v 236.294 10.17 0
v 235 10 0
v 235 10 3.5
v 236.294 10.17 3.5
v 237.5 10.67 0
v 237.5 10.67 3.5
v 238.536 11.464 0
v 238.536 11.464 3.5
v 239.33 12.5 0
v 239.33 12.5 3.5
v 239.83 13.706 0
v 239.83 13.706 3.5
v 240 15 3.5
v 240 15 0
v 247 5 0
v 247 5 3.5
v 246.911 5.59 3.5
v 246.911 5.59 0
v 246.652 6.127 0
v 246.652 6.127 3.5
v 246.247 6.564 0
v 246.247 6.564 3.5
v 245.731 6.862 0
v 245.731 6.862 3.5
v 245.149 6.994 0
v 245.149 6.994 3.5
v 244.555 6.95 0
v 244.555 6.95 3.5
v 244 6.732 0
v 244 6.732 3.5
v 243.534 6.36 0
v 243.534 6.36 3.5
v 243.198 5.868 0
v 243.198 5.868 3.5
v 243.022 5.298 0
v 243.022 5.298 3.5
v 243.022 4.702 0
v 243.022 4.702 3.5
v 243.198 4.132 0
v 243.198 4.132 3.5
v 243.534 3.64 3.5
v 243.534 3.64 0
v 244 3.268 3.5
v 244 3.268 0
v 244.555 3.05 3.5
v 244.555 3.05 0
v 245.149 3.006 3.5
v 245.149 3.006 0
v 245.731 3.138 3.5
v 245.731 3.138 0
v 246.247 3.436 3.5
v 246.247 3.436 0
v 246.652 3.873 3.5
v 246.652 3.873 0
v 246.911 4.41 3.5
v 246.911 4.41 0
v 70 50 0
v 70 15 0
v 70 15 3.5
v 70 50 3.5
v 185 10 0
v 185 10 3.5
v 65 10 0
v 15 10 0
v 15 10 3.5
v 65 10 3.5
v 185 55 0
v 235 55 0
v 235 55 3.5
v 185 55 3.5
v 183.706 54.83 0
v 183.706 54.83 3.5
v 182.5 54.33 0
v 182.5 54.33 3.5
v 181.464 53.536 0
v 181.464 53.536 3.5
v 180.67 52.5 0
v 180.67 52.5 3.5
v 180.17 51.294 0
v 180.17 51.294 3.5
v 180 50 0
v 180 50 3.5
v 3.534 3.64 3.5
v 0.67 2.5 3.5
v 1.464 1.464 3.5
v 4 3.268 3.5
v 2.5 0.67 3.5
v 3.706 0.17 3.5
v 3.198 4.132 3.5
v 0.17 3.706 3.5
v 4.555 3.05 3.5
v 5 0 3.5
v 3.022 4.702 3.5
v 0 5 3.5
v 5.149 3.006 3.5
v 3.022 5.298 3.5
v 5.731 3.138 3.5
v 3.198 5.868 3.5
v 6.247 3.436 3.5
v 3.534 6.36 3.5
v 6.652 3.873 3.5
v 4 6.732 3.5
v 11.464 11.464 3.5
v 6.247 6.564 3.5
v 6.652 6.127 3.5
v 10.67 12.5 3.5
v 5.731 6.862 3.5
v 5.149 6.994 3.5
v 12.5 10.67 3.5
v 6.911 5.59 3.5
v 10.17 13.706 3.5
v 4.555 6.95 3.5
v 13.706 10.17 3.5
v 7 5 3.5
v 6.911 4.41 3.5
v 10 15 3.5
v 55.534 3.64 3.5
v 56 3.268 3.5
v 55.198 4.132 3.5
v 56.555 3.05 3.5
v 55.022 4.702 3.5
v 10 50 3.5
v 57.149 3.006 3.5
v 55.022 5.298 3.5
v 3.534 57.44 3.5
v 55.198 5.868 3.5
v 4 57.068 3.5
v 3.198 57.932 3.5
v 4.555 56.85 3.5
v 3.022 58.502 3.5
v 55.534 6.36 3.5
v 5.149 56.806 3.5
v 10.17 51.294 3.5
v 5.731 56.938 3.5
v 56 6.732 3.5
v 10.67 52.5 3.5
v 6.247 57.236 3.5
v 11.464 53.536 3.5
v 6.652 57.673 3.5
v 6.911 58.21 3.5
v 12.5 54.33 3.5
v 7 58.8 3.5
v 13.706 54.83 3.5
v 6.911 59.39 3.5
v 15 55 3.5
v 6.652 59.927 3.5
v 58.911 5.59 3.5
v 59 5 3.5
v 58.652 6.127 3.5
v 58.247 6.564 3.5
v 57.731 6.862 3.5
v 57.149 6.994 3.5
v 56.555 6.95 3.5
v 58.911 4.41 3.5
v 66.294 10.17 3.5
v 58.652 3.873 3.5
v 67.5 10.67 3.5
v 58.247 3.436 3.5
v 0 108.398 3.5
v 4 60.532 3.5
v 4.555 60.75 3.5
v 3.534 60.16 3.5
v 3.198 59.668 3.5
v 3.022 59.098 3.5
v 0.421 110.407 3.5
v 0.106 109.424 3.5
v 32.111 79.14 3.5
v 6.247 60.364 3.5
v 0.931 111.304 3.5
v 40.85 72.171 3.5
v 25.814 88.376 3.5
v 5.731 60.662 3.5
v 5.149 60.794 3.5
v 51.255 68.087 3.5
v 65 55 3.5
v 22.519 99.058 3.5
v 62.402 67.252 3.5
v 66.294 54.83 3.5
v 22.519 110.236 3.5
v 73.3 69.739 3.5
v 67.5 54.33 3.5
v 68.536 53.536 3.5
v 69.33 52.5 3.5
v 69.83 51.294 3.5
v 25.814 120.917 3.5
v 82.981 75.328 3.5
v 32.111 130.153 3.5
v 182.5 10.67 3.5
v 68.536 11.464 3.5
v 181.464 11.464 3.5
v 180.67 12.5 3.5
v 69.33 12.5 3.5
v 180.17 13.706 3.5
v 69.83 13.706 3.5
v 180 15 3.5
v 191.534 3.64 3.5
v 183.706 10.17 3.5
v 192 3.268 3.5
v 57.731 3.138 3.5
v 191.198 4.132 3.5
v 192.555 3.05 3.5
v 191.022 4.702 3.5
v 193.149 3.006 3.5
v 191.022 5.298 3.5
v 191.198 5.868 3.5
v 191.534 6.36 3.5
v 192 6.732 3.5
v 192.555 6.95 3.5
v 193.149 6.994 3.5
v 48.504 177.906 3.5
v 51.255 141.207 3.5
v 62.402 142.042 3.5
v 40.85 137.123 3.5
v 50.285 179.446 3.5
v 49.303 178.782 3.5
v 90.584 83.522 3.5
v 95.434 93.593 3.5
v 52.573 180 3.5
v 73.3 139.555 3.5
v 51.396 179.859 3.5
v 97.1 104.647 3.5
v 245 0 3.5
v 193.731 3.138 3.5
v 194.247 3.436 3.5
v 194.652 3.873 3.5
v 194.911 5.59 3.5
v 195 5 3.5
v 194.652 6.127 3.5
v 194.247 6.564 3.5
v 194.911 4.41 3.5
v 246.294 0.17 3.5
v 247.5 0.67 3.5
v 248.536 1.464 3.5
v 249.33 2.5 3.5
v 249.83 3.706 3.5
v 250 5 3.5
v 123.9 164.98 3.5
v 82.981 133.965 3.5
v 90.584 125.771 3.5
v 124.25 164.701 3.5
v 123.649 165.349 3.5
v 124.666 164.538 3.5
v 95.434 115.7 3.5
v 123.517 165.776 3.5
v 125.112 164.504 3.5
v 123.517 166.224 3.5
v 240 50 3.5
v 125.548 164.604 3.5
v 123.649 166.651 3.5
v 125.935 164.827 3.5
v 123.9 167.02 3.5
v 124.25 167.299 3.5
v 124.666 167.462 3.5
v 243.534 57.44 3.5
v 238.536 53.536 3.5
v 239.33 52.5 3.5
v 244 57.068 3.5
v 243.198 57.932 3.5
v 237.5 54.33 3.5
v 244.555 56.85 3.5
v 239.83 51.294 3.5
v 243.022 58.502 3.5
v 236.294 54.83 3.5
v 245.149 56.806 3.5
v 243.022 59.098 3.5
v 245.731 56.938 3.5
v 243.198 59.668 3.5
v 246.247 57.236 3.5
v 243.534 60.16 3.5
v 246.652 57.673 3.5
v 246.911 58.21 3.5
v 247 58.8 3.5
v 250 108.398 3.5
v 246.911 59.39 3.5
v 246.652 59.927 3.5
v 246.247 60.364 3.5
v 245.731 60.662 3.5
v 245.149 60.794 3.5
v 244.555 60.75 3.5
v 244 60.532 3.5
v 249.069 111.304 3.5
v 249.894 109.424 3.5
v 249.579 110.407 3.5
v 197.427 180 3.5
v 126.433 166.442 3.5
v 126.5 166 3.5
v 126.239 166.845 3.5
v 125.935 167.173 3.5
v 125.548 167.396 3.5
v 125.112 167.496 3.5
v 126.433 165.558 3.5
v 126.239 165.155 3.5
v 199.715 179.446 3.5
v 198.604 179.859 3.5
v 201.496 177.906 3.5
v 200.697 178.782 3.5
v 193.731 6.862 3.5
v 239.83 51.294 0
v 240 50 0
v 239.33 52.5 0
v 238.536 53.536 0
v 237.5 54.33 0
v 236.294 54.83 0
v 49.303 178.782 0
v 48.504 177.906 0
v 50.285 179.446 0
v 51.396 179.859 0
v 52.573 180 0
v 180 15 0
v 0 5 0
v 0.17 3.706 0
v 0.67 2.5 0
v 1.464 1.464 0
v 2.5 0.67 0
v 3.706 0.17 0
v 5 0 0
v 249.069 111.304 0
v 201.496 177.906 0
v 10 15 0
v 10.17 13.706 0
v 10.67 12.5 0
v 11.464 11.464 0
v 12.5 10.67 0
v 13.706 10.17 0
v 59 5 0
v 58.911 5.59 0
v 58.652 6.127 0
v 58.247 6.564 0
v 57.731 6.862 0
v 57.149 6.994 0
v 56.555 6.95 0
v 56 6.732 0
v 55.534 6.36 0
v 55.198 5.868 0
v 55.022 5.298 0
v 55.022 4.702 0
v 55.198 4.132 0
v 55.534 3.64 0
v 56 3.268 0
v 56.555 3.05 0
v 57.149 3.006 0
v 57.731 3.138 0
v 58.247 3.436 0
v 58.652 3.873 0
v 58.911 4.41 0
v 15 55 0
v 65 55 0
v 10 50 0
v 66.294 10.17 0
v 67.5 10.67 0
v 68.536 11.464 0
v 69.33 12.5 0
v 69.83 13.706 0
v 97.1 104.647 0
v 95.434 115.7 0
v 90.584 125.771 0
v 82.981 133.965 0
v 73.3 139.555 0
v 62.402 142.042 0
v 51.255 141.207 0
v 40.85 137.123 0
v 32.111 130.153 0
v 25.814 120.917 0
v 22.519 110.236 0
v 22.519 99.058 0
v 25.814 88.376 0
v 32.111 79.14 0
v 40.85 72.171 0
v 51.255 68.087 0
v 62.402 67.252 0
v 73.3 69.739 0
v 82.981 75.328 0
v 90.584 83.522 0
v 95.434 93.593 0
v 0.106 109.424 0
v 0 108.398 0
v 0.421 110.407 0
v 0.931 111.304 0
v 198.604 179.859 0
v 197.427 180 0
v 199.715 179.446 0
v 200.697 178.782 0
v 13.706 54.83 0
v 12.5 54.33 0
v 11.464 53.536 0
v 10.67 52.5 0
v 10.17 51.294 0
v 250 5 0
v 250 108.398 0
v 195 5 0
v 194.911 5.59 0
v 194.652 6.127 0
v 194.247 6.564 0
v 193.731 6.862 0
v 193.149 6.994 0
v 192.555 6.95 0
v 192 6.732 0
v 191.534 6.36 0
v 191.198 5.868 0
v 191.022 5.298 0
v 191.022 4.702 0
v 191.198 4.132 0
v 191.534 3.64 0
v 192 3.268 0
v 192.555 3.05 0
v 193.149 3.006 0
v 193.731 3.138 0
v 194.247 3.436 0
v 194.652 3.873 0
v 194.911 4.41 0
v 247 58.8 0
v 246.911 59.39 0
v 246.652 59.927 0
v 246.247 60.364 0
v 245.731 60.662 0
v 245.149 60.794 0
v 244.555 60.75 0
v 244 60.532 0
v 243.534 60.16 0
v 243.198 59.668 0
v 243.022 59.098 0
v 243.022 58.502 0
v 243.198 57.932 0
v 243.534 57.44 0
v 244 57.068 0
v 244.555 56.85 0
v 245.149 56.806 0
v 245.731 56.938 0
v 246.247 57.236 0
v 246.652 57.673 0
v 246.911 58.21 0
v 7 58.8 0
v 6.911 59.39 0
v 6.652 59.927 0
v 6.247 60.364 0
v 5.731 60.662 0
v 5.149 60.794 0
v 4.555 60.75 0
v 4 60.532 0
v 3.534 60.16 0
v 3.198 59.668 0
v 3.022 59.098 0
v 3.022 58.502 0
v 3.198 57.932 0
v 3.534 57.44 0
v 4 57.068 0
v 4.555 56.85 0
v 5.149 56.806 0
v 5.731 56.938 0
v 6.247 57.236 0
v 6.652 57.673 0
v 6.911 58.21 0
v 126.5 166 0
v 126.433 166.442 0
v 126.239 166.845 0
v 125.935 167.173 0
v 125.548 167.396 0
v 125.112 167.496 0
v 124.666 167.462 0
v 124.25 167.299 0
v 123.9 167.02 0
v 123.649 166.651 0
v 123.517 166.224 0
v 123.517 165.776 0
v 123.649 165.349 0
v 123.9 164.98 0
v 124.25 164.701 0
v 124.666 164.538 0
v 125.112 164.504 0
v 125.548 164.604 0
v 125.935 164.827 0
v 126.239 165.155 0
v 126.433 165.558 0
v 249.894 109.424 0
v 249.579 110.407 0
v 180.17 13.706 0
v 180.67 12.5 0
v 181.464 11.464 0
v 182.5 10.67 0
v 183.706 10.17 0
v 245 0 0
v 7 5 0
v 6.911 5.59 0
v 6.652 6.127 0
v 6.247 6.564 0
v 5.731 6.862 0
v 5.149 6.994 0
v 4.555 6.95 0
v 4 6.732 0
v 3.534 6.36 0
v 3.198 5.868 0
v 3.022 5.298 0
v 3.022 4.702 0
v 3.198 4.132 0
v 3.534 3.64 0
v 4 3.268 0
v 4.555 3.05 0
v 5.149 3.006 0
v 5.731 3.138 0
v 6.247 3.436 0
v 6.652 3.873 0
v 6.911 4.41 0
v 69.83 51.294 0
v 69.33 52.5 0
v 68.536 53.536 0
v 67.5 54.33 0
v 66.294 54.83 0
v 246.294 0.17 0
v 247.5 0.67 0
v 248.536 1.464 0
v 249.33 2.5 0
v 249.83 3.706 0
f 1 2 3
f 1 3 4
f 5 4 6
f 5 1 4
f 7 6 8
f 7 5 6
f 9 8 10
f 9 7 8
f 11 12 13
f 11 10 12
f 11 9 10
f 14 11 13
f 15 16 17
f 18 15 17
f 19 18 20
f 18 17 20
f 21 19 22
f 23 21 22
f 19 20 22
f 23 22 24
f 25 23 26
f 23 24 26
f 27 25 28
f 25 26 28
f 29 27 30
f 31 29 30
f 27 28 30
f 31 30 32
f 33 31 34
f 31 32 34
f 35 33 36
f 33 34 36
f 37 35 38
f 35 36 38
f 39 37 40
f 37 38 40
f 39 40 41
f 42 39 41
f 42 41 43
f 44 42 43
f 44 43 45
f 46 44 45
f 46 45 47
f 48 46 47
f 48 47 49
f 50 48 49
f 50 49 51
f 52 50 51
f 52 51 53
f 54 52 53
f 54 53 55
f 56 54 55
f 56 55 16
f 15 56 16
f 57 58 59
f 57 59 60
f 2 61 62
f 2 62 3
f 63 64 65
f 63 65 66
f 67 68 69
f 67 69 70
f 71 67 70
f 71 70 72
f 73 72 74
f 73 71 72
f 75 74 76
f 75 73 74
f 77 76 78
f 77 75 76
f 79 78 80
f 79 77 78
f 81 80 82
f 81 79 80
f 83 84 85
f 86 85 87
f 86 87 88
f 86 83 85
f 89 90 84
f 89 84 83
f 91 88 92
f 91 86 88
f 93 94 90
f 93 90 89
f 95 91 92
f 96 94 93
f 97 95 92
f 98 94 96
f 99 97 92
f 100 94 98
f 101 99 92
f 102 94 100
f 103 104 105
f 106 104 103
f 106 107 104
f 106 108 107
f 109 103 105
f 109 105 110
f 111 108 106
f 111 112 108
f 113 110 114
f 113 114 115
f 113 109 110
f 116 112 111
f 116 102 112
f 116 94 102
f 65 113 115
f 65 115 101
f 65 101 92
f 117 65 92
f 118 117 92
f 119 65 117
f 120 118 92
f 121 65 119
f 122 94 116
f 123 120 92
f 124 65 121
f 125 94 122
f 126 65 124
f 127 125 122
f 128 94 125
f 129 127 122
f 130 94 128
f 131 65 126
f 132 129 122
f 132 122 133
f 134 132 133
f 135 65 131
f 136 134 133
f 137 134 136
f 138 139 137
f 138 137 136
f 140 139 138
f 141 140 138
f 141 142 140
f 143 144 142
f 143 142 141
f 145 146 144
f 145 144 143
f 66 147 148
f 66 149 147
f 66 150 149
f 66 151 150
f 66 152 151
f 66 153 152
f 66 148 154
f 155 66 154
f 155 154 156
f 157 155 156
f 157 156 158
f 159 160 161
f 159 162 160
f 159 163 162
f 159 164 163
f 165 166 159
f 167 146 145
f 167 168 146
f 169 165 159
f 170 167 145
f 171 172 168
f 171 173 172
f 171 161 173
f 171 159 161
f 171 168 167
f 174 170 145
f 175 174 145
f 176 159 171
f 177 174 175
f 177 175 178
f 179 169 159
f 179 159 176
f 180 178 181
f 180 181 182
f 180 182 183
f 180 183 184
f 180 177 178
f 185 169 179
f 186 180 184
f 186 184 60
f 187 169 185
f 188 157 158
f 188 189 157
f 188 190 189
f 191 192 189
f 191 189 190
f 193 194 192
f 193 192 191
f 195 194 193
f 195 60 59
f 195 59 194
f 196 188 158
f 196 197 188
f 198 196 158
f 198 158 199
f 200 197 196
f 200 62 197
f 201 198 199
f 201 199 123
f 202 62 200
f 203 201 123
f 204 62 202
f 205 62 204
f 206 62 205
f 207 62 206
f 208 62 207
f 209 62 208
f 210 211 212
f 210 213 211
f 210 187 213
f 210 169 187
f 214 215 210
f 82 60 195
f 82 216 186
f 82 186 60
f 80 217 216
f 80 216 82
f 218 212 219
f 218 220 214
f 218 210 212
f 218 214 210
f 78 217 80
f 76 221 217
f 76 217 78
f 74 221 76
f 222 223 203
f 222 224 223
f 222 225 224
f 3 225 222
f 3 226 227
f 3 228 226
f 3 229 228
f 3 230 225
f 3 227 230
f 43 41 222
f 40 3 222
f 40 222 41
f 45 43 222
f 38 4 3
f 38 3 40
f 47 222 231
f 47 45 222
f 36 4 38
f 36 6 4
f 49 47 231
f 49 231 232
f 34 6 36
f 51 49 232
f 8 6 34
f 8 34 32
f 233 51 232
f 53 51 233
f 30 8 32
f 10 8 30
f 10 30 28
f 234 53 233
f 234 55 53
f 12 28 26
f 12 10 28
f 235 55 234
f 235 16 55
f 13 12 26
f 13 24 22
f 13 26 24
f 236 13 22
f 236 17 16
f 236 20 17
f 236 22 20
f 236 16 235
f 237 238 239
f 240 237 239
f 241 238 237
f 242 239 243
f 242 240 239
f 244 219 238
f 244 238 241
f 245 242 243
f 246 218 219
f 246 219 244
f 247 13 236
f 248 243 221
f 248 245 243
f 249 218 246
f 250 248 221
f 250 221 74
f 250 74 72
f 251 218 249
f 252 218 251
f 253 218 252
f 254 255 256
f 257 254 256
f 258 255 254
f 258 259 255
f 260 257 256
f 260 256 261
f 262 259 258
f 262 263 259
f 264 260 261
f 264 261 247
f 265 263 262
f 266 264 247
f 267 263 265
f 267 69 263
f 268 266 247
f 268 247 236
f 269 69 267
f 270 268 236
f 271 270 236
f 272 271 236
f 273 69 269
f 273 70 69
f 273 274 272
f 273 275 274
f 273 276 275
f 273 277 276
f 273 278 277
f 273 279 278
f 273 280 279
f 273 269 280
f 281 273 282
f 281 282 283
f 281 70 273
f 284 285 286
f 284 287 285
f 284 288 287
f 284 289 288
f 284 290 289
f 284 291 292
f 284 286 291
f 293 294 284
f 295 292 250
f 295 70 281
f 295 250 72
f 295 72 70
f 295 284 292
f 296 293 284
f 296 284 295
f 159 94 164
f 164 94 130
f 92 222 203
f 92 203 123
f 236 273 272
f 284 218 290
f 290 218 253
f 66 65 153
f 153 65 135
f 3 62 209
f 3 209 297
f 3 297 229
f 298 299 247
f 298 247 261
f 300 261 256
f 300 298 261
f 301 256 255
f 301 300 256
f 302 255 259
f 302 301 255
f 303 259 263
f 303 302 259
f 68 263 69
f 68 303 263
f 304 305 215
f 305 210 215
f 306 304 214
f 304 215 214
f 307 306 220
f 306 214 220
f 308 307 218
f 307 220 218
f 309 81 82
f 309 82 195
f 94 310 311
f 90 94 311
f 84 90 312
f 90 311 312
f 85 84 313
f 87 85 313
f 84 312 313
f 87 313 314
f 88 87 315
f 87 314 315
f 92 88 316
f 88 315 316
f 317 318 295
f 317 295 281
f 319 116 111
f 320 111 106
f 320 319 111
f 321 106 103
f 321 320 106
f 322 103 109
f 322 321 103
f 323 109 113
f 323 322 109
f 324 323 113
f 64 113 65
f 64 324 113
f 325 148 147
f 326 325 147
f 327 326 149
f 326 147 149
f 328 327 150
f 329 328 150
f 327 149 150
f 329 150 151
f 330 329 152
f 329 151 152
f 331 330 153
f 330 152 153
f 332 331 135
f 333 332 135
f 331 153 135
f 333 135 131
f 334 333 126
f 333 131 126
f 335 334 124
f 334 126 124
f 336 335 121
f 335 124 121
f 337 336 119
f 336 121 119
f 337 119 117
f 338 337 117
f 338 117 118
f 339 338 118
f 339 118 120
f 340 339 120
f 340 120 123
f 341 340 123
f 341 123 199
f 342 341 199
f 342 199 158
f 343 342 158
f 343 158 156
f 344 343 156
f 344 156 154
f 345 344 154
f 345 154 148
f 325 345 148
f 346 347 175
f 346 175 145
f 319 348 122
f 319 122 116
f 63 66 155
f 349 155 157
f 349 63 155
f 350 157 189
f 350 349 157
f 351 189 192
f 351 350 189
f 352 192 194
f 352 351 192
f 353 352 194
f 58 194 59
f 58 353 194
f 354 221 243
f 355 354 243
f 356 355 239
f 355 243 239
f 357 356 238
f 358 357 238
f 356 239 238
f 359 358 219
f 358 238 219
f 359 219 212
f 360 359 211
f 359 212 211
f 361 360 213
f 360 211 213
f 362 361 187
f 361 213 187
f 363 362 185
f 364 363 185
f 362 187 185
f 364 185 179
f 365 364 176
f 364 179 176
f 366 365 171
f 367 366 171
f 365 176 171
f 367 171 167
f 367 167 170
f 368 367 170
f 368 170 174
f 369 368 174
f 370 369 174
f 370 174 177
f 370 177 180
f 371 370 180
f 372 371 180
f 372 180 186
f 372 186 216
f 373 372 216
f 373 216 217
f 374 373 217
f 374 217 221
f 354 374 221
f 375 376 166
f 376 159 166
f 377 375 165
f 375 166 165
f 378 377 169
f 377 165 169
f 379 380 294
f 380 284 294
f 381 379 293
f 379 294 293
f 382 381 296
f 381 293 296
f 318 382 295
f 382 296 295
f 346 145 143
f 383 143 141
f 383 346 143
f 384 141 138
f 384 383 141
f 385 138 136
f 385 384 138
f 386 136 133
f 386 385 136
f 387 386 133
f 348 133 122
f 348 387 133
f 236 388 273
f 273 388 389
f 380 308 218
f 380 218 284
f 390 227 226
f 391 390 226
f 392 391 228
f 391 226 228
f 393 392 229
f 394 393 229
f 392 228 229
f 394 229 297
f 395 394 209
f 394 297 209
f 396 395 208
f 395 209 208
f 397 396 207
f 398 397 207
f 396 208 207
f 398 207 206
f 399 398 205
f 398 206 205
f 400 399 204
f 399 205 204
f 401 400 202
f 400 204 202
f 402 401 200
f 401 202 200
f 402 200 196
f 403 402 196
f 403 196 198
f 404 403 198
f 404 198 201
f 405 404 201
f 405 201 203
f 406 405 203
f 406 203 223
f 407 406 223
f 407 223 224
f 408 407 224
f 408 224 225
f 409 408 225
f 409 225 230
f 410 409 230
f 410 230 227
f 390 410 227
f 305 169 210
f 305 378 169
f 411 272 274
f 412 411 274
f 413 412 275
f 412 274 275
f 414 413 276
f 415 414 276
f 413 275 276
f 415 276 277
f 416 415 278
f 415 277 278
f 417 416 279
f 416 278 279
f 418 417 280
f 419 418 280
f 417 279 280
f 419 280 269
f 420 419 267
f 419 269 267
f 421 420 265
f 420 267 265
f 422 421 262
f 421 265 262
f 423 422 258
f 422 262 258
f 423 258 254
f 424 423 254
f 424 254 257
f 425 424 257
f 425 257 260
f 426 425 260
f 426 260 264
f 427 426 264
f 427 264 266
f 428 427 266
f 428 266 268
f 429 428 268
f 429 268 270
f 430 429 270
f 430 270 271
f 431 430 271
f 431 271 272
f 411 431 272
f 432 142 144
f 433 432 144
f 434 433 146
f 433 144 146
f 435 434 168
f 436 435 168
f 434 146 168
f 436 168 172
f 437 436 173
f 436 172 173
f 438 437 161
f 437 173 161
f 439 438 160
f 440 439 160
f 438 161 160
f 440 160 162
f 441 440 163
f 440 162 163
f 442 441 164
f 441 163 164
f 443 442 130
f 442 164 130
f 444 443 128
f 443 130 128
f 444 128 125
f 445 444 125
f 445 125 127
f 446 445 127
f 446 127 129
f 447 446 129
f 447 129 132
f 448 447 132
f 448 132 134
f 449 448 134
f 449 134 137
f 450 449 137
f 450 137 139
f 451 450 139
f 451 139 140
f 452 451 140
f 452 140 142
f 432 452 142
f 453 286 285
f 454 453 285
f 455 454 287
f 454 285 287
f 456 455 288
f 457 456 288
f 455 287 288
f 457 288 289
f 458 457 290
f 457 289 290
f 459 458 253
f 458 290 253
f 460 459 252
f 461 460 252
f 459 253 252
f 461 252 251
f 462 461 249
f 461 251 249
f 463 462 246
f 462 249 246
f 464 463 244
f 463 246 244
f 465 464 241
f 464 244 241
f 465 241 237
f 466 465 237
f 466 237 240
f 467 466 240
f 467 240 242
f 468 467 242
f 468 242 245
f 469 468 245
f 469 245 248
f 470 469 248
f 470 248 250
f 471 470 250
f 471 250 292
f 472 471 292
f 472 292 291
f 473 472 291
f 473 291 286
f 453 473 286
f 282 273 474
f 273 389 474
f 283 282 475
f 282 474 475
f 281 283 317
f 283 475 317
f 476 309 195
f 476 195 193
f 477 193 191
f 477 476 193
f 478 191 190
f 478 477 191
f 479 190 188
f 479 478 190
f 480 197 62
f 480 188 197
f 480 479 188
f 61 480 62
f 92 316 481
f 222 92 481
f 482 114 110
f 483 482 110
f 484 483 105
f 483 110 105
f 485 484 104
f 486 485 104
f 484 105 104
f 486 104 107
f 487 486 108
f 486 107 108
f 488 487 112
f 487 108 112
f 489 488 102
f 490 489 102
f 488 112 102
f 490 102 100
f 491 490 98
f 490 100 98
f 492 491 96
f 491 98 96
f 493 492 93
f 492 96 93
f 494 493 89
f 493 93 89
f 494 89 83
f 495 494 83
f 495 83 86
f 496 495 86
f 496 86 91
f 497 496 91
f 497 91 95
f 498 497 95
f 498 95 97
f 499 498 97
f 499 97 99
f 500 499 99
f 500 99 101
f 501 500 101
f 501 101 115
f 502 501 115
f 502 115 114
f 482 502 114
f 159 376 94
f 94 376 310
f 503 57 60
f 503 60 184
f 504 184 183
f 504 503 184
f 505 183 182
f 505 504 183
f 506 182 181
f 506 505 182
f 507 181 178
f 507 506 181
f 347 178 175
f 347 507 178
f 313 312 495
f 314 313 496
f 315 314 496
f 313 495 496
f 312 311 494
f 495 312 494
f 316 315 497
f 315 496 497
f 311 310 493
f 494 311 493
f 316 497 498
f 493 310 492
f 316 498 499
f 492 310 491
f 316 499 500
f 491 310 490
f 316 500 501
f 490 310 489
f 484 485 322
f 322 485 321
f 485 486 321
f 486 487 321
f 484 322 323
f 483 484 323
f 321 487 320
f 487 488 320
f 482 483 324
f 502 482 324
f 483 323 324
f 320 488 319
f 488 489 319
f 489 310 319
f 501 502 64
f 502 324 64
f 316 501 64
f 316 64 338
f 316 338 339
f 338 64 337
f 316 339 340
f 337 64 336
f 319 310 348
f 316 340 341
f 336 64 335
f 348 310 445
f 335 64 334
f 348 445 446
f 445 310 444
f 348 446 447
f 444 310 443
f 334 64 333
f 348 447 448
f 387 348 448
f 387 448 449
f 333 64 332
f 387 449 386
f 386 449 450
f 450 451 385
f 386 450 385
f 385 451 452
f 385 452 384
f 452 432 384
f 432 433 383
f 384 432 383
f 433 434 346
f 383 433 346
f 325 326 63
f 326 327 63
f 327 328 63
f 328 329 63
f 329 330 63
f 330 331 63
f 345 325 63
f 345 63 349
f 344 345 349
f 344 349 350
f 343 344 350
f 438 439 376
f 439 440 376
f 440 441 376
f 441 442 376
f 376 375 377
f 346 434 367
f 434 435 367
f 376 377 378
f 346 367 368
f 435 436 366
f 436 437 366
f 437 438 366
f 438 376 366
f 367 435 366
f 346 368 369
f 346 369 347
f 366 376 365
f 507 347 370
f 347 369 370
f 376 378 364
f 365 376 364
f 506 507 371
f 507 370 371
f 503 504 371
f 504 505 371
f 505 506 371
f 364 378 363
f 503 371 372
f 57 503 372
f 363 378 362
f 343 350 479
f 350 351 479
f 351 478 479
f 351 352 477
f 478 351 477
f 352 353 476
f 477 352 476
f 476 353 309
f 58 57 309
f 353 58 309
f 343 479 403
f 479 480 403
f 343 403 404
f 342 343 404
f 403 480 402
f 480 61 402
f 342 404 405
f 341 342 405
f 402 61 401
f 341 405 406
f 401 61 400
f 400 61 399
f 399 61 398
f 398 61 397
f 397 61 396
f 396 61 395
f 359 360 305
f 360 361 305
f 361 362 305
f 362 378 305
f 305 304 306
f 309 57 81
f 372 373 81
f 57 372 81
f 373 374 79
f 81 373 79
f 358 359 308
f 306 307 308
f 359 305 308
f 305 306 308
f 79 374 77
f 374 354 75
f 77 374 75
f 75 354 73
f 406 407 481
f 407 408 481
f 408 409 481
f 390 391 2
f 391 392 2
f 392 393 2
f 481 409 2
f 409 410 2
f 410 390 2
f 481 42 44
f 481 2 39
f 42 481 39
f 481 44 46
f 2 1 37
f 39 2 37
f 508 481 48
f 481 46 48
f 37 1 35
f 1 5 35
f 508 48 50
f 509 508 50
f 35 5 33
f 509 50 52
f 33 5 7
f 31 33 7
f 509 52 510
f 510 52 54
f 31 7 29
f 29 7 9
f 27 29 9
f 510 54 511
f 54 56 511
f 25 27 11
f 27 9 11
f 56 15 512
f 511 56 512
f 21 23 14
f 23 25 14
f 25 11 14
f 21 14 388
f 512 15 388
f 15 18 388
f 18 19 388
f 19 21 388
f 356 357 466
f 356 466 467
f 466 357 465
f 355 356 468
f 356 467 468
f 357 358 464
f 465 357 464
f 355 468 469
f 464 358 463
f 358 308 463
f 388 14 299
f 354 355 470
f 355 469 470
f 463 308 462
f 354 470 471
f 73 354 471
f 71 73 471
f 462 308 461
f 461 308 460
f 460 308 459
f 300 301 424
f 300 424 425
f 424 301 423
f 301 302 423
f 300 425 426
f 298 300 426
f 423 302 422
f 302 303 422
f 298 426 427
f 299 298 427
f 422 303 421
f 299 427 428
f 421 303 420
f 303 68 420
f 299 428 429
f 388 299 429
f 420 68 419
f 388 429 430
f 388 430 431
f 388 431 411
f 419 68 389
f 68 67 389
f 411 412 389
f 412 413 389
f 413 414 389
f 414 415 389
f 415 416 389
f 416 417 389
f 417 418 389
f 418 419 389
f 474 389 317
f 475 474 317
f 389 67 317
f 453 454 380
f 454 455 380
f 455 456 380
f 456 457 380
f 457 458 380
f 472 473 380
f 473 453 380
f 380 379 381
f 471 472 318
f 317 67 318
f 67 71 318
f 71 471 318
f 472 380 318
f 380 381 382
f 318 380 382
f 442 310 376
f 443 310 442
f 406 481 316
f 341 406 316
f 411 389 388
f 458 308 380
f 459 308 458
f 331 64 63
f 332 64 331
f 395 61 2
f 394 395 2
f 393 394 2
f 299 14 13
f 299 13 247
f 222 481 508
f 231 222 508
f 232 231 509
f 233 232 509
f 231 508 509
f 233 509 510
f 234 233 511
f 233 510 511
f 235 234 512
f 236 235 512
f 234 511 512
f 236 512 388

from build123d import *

# Parameters (mm, degrees)
BOSS_EXTRU_1_DEPTH           = 3.5
ESQUISSE2_R                  = 2
ENL_V_MAT_EXTRU_1_DEPTH      = 395.382111663
ESQUISSE3_R                  = 2
ENL_V_MAT_EXTRU_2_DEPTH      = 395.382111663
ENL_V_MAT_EXTRU_3_DEPTH      = 395.382111663
ENL_V_MAT_EXTRU_4_DEPTH      = 395.382111663
ENL_V_MAT_EXTRU_4_DEPTH_BACK = 395.382111663
ESQUISSE6_R                  = 1.5
ENL_V_MAT_EXTRU_5_DEPTH      = 309.078317965
CONG_1_R                     = 5
ESQUISSE7_R                  = 37.5
ENL_V_MAT_EXTRU_6_DEPTH      = 309.078317965


with BuildPart() as part:
    # Esquisse1 → Boss.-Extru.1 (new body)
    with BuildSketch(Plane.XY):
        with BuildLine():
            Line((5, 0), (245, 0))
            ThreePointArc((245, 0), (248.535533906, 1.464466094), (250, 5))
            Line((250, 5), (250, 305))
            Line((250, 305), (0, 305))
            Line((0, 305), (0, 5))
            ThreePointArc((0, 5), (1.464466094, 1.464466094), (5, 0))
        make_face()
    extrude(amount=BOSS_EXTRU_1_DEPTH)

    # Esquisse2 → Enlèv. mat.-Extru.1 (cut, through all)
    with BuildSketch(Plane.XY.offset(3.5)):
        with Locations((5, 5)):
            Circle(ESQUISSE2_R)
        with Locations((245, 5)):
            Circle(ESQUISSE2_R)
        with Locations((5, 58.8)):
            Circle(ESQUISSE2_R)
        with Locations((245, 58.8)):
            Circle(ESQUISSE2_R)
    extrude(amount=-ENL_V_MAT_EXTRU_1_DEPTH, mode=Mode.SUBTRACT)

    # Esquisse3 → Enlèv. mat.-Extru.2 (cut, through all)
    with BuildSketch(Plane.XY.offset(3.5)):
        with Locations((57, 5)):
            Circle(ESQUISSE3_R)
        with Locations((193, 5)):
            Circle(ESQUISSE3_R)
    extrude(amount=-ENL_V_MAT_EXTRU_2_DEPTH, mode=Mode.SUBTRACT)

    # Esquisse4 → Enlèv. mat.-Extru.3 (cut, through all)
    with BuildSketch(Plane(origin=(0, 0, 0), x_dir=(-1, 0, 0), z_dir=(0, 0, -1))):
        with BuildLine():
            Line((-70, 15), (-70, 50))
            ThreePointArc((-70, 50), (-68.535533906, 53.535533906), (-65, 55))
            Line((-65, 55), (-15, 55))
            ThreePointArc((-15, 55), (-11.464466094, 53.535533906), (-10, 50))
            Line((-10, 50), (-10, 15))
            ThreePointArc((-10, 15), (-11.464466094, 11.464466094), (-15, 10))
            Line((-15, 10), (-65, 10))
            ThreePointArc((-65, 10), (-68.535533906, 11.464466094), (-70, 15))
        make_face()
        with BuildLine():
            Line((-185, 10), (-235, 10))
            ThreePointArc((-235, 10), (-238.535533906, 11.464466094), (-240, 15))
            Line((-240, 15), (-240, 50))
            ThreePointArc((-240, 50), (-238.535533906, 53.535533906), (-235, 55))
            Line((-235, 55), (-185, 55))
            ThreePointArc((-185, 55), (-181.464466094, 53.535533906), (-180, 50))
            Line((-180, 50), (-180, 15))
            ThreePointArc((-180, 15), (-181.464466094, 11.464466094), (-185, 10))
        make_face()
    extrude(amount=-ENL_V_MAT_EXTRU_3_DEPTH, mode=Mode.SUBTRACT)

    # Esquisse5 → Enlèv. mat.-Extru.4 (cut, two sides: drawn at the far end of the back side and taken through both)
    with BuildSketch(Plane.XY.offset(3.5).offset(-ENL_V_MAT_EXTRU_4_DEPTH_BACK)):
        Polygon((-374.383398967, -414.136758554), (0, 110), (50, 180), (200, 180), (250, 110), (624.383398967, -414.136758554), (624.383398967, 874.090350445), (-374.383398967, 874.090350445), align=None)
    extrude(amount=ENL_V_MAT_EXTRU_4_DEPTH + ENL_V_MAT_EXTRU_4_DEPTH_BACK, mode=Mode.SUBTRACT)

    # Esquisse6 → Enlèv. mat.-Extru.5 (cut, through all)
    with BuildSketch(Plane.XY.offset(3.5)):
        with Locations((125, 166)):
            Circle(ESQUISSE6_R)
    extrude(amount=-ENL_V_MAT_EXTRU_5_DEPTH, mode=Mode.SUBTRACT)

    # Congé1
    cong_1_edges = [part.edges().sort_by_distance(p)[0] for p in [
        (50, 180, 1.75),
        (200, 180, 1.75),
        (250, 110, 1.75),
        (0, 110, 1.75),
    ]]
    fillet(cong_1_edges, radius=CONG_1_R)

    # Esquisse7 → Enlèv. mat.-Extru.6 (cut, through all)
    with BuildSketch(Plane.XY.offset(3.5)):
        with Locations((59.6, 104.646798594)):
            Circle(ESQUISSE7_R)
    extrude(amount=-ENL_V_MAT_EXTRU_6_DEPTH, mode=Mode.SUBTRACT)


solid = part.part
